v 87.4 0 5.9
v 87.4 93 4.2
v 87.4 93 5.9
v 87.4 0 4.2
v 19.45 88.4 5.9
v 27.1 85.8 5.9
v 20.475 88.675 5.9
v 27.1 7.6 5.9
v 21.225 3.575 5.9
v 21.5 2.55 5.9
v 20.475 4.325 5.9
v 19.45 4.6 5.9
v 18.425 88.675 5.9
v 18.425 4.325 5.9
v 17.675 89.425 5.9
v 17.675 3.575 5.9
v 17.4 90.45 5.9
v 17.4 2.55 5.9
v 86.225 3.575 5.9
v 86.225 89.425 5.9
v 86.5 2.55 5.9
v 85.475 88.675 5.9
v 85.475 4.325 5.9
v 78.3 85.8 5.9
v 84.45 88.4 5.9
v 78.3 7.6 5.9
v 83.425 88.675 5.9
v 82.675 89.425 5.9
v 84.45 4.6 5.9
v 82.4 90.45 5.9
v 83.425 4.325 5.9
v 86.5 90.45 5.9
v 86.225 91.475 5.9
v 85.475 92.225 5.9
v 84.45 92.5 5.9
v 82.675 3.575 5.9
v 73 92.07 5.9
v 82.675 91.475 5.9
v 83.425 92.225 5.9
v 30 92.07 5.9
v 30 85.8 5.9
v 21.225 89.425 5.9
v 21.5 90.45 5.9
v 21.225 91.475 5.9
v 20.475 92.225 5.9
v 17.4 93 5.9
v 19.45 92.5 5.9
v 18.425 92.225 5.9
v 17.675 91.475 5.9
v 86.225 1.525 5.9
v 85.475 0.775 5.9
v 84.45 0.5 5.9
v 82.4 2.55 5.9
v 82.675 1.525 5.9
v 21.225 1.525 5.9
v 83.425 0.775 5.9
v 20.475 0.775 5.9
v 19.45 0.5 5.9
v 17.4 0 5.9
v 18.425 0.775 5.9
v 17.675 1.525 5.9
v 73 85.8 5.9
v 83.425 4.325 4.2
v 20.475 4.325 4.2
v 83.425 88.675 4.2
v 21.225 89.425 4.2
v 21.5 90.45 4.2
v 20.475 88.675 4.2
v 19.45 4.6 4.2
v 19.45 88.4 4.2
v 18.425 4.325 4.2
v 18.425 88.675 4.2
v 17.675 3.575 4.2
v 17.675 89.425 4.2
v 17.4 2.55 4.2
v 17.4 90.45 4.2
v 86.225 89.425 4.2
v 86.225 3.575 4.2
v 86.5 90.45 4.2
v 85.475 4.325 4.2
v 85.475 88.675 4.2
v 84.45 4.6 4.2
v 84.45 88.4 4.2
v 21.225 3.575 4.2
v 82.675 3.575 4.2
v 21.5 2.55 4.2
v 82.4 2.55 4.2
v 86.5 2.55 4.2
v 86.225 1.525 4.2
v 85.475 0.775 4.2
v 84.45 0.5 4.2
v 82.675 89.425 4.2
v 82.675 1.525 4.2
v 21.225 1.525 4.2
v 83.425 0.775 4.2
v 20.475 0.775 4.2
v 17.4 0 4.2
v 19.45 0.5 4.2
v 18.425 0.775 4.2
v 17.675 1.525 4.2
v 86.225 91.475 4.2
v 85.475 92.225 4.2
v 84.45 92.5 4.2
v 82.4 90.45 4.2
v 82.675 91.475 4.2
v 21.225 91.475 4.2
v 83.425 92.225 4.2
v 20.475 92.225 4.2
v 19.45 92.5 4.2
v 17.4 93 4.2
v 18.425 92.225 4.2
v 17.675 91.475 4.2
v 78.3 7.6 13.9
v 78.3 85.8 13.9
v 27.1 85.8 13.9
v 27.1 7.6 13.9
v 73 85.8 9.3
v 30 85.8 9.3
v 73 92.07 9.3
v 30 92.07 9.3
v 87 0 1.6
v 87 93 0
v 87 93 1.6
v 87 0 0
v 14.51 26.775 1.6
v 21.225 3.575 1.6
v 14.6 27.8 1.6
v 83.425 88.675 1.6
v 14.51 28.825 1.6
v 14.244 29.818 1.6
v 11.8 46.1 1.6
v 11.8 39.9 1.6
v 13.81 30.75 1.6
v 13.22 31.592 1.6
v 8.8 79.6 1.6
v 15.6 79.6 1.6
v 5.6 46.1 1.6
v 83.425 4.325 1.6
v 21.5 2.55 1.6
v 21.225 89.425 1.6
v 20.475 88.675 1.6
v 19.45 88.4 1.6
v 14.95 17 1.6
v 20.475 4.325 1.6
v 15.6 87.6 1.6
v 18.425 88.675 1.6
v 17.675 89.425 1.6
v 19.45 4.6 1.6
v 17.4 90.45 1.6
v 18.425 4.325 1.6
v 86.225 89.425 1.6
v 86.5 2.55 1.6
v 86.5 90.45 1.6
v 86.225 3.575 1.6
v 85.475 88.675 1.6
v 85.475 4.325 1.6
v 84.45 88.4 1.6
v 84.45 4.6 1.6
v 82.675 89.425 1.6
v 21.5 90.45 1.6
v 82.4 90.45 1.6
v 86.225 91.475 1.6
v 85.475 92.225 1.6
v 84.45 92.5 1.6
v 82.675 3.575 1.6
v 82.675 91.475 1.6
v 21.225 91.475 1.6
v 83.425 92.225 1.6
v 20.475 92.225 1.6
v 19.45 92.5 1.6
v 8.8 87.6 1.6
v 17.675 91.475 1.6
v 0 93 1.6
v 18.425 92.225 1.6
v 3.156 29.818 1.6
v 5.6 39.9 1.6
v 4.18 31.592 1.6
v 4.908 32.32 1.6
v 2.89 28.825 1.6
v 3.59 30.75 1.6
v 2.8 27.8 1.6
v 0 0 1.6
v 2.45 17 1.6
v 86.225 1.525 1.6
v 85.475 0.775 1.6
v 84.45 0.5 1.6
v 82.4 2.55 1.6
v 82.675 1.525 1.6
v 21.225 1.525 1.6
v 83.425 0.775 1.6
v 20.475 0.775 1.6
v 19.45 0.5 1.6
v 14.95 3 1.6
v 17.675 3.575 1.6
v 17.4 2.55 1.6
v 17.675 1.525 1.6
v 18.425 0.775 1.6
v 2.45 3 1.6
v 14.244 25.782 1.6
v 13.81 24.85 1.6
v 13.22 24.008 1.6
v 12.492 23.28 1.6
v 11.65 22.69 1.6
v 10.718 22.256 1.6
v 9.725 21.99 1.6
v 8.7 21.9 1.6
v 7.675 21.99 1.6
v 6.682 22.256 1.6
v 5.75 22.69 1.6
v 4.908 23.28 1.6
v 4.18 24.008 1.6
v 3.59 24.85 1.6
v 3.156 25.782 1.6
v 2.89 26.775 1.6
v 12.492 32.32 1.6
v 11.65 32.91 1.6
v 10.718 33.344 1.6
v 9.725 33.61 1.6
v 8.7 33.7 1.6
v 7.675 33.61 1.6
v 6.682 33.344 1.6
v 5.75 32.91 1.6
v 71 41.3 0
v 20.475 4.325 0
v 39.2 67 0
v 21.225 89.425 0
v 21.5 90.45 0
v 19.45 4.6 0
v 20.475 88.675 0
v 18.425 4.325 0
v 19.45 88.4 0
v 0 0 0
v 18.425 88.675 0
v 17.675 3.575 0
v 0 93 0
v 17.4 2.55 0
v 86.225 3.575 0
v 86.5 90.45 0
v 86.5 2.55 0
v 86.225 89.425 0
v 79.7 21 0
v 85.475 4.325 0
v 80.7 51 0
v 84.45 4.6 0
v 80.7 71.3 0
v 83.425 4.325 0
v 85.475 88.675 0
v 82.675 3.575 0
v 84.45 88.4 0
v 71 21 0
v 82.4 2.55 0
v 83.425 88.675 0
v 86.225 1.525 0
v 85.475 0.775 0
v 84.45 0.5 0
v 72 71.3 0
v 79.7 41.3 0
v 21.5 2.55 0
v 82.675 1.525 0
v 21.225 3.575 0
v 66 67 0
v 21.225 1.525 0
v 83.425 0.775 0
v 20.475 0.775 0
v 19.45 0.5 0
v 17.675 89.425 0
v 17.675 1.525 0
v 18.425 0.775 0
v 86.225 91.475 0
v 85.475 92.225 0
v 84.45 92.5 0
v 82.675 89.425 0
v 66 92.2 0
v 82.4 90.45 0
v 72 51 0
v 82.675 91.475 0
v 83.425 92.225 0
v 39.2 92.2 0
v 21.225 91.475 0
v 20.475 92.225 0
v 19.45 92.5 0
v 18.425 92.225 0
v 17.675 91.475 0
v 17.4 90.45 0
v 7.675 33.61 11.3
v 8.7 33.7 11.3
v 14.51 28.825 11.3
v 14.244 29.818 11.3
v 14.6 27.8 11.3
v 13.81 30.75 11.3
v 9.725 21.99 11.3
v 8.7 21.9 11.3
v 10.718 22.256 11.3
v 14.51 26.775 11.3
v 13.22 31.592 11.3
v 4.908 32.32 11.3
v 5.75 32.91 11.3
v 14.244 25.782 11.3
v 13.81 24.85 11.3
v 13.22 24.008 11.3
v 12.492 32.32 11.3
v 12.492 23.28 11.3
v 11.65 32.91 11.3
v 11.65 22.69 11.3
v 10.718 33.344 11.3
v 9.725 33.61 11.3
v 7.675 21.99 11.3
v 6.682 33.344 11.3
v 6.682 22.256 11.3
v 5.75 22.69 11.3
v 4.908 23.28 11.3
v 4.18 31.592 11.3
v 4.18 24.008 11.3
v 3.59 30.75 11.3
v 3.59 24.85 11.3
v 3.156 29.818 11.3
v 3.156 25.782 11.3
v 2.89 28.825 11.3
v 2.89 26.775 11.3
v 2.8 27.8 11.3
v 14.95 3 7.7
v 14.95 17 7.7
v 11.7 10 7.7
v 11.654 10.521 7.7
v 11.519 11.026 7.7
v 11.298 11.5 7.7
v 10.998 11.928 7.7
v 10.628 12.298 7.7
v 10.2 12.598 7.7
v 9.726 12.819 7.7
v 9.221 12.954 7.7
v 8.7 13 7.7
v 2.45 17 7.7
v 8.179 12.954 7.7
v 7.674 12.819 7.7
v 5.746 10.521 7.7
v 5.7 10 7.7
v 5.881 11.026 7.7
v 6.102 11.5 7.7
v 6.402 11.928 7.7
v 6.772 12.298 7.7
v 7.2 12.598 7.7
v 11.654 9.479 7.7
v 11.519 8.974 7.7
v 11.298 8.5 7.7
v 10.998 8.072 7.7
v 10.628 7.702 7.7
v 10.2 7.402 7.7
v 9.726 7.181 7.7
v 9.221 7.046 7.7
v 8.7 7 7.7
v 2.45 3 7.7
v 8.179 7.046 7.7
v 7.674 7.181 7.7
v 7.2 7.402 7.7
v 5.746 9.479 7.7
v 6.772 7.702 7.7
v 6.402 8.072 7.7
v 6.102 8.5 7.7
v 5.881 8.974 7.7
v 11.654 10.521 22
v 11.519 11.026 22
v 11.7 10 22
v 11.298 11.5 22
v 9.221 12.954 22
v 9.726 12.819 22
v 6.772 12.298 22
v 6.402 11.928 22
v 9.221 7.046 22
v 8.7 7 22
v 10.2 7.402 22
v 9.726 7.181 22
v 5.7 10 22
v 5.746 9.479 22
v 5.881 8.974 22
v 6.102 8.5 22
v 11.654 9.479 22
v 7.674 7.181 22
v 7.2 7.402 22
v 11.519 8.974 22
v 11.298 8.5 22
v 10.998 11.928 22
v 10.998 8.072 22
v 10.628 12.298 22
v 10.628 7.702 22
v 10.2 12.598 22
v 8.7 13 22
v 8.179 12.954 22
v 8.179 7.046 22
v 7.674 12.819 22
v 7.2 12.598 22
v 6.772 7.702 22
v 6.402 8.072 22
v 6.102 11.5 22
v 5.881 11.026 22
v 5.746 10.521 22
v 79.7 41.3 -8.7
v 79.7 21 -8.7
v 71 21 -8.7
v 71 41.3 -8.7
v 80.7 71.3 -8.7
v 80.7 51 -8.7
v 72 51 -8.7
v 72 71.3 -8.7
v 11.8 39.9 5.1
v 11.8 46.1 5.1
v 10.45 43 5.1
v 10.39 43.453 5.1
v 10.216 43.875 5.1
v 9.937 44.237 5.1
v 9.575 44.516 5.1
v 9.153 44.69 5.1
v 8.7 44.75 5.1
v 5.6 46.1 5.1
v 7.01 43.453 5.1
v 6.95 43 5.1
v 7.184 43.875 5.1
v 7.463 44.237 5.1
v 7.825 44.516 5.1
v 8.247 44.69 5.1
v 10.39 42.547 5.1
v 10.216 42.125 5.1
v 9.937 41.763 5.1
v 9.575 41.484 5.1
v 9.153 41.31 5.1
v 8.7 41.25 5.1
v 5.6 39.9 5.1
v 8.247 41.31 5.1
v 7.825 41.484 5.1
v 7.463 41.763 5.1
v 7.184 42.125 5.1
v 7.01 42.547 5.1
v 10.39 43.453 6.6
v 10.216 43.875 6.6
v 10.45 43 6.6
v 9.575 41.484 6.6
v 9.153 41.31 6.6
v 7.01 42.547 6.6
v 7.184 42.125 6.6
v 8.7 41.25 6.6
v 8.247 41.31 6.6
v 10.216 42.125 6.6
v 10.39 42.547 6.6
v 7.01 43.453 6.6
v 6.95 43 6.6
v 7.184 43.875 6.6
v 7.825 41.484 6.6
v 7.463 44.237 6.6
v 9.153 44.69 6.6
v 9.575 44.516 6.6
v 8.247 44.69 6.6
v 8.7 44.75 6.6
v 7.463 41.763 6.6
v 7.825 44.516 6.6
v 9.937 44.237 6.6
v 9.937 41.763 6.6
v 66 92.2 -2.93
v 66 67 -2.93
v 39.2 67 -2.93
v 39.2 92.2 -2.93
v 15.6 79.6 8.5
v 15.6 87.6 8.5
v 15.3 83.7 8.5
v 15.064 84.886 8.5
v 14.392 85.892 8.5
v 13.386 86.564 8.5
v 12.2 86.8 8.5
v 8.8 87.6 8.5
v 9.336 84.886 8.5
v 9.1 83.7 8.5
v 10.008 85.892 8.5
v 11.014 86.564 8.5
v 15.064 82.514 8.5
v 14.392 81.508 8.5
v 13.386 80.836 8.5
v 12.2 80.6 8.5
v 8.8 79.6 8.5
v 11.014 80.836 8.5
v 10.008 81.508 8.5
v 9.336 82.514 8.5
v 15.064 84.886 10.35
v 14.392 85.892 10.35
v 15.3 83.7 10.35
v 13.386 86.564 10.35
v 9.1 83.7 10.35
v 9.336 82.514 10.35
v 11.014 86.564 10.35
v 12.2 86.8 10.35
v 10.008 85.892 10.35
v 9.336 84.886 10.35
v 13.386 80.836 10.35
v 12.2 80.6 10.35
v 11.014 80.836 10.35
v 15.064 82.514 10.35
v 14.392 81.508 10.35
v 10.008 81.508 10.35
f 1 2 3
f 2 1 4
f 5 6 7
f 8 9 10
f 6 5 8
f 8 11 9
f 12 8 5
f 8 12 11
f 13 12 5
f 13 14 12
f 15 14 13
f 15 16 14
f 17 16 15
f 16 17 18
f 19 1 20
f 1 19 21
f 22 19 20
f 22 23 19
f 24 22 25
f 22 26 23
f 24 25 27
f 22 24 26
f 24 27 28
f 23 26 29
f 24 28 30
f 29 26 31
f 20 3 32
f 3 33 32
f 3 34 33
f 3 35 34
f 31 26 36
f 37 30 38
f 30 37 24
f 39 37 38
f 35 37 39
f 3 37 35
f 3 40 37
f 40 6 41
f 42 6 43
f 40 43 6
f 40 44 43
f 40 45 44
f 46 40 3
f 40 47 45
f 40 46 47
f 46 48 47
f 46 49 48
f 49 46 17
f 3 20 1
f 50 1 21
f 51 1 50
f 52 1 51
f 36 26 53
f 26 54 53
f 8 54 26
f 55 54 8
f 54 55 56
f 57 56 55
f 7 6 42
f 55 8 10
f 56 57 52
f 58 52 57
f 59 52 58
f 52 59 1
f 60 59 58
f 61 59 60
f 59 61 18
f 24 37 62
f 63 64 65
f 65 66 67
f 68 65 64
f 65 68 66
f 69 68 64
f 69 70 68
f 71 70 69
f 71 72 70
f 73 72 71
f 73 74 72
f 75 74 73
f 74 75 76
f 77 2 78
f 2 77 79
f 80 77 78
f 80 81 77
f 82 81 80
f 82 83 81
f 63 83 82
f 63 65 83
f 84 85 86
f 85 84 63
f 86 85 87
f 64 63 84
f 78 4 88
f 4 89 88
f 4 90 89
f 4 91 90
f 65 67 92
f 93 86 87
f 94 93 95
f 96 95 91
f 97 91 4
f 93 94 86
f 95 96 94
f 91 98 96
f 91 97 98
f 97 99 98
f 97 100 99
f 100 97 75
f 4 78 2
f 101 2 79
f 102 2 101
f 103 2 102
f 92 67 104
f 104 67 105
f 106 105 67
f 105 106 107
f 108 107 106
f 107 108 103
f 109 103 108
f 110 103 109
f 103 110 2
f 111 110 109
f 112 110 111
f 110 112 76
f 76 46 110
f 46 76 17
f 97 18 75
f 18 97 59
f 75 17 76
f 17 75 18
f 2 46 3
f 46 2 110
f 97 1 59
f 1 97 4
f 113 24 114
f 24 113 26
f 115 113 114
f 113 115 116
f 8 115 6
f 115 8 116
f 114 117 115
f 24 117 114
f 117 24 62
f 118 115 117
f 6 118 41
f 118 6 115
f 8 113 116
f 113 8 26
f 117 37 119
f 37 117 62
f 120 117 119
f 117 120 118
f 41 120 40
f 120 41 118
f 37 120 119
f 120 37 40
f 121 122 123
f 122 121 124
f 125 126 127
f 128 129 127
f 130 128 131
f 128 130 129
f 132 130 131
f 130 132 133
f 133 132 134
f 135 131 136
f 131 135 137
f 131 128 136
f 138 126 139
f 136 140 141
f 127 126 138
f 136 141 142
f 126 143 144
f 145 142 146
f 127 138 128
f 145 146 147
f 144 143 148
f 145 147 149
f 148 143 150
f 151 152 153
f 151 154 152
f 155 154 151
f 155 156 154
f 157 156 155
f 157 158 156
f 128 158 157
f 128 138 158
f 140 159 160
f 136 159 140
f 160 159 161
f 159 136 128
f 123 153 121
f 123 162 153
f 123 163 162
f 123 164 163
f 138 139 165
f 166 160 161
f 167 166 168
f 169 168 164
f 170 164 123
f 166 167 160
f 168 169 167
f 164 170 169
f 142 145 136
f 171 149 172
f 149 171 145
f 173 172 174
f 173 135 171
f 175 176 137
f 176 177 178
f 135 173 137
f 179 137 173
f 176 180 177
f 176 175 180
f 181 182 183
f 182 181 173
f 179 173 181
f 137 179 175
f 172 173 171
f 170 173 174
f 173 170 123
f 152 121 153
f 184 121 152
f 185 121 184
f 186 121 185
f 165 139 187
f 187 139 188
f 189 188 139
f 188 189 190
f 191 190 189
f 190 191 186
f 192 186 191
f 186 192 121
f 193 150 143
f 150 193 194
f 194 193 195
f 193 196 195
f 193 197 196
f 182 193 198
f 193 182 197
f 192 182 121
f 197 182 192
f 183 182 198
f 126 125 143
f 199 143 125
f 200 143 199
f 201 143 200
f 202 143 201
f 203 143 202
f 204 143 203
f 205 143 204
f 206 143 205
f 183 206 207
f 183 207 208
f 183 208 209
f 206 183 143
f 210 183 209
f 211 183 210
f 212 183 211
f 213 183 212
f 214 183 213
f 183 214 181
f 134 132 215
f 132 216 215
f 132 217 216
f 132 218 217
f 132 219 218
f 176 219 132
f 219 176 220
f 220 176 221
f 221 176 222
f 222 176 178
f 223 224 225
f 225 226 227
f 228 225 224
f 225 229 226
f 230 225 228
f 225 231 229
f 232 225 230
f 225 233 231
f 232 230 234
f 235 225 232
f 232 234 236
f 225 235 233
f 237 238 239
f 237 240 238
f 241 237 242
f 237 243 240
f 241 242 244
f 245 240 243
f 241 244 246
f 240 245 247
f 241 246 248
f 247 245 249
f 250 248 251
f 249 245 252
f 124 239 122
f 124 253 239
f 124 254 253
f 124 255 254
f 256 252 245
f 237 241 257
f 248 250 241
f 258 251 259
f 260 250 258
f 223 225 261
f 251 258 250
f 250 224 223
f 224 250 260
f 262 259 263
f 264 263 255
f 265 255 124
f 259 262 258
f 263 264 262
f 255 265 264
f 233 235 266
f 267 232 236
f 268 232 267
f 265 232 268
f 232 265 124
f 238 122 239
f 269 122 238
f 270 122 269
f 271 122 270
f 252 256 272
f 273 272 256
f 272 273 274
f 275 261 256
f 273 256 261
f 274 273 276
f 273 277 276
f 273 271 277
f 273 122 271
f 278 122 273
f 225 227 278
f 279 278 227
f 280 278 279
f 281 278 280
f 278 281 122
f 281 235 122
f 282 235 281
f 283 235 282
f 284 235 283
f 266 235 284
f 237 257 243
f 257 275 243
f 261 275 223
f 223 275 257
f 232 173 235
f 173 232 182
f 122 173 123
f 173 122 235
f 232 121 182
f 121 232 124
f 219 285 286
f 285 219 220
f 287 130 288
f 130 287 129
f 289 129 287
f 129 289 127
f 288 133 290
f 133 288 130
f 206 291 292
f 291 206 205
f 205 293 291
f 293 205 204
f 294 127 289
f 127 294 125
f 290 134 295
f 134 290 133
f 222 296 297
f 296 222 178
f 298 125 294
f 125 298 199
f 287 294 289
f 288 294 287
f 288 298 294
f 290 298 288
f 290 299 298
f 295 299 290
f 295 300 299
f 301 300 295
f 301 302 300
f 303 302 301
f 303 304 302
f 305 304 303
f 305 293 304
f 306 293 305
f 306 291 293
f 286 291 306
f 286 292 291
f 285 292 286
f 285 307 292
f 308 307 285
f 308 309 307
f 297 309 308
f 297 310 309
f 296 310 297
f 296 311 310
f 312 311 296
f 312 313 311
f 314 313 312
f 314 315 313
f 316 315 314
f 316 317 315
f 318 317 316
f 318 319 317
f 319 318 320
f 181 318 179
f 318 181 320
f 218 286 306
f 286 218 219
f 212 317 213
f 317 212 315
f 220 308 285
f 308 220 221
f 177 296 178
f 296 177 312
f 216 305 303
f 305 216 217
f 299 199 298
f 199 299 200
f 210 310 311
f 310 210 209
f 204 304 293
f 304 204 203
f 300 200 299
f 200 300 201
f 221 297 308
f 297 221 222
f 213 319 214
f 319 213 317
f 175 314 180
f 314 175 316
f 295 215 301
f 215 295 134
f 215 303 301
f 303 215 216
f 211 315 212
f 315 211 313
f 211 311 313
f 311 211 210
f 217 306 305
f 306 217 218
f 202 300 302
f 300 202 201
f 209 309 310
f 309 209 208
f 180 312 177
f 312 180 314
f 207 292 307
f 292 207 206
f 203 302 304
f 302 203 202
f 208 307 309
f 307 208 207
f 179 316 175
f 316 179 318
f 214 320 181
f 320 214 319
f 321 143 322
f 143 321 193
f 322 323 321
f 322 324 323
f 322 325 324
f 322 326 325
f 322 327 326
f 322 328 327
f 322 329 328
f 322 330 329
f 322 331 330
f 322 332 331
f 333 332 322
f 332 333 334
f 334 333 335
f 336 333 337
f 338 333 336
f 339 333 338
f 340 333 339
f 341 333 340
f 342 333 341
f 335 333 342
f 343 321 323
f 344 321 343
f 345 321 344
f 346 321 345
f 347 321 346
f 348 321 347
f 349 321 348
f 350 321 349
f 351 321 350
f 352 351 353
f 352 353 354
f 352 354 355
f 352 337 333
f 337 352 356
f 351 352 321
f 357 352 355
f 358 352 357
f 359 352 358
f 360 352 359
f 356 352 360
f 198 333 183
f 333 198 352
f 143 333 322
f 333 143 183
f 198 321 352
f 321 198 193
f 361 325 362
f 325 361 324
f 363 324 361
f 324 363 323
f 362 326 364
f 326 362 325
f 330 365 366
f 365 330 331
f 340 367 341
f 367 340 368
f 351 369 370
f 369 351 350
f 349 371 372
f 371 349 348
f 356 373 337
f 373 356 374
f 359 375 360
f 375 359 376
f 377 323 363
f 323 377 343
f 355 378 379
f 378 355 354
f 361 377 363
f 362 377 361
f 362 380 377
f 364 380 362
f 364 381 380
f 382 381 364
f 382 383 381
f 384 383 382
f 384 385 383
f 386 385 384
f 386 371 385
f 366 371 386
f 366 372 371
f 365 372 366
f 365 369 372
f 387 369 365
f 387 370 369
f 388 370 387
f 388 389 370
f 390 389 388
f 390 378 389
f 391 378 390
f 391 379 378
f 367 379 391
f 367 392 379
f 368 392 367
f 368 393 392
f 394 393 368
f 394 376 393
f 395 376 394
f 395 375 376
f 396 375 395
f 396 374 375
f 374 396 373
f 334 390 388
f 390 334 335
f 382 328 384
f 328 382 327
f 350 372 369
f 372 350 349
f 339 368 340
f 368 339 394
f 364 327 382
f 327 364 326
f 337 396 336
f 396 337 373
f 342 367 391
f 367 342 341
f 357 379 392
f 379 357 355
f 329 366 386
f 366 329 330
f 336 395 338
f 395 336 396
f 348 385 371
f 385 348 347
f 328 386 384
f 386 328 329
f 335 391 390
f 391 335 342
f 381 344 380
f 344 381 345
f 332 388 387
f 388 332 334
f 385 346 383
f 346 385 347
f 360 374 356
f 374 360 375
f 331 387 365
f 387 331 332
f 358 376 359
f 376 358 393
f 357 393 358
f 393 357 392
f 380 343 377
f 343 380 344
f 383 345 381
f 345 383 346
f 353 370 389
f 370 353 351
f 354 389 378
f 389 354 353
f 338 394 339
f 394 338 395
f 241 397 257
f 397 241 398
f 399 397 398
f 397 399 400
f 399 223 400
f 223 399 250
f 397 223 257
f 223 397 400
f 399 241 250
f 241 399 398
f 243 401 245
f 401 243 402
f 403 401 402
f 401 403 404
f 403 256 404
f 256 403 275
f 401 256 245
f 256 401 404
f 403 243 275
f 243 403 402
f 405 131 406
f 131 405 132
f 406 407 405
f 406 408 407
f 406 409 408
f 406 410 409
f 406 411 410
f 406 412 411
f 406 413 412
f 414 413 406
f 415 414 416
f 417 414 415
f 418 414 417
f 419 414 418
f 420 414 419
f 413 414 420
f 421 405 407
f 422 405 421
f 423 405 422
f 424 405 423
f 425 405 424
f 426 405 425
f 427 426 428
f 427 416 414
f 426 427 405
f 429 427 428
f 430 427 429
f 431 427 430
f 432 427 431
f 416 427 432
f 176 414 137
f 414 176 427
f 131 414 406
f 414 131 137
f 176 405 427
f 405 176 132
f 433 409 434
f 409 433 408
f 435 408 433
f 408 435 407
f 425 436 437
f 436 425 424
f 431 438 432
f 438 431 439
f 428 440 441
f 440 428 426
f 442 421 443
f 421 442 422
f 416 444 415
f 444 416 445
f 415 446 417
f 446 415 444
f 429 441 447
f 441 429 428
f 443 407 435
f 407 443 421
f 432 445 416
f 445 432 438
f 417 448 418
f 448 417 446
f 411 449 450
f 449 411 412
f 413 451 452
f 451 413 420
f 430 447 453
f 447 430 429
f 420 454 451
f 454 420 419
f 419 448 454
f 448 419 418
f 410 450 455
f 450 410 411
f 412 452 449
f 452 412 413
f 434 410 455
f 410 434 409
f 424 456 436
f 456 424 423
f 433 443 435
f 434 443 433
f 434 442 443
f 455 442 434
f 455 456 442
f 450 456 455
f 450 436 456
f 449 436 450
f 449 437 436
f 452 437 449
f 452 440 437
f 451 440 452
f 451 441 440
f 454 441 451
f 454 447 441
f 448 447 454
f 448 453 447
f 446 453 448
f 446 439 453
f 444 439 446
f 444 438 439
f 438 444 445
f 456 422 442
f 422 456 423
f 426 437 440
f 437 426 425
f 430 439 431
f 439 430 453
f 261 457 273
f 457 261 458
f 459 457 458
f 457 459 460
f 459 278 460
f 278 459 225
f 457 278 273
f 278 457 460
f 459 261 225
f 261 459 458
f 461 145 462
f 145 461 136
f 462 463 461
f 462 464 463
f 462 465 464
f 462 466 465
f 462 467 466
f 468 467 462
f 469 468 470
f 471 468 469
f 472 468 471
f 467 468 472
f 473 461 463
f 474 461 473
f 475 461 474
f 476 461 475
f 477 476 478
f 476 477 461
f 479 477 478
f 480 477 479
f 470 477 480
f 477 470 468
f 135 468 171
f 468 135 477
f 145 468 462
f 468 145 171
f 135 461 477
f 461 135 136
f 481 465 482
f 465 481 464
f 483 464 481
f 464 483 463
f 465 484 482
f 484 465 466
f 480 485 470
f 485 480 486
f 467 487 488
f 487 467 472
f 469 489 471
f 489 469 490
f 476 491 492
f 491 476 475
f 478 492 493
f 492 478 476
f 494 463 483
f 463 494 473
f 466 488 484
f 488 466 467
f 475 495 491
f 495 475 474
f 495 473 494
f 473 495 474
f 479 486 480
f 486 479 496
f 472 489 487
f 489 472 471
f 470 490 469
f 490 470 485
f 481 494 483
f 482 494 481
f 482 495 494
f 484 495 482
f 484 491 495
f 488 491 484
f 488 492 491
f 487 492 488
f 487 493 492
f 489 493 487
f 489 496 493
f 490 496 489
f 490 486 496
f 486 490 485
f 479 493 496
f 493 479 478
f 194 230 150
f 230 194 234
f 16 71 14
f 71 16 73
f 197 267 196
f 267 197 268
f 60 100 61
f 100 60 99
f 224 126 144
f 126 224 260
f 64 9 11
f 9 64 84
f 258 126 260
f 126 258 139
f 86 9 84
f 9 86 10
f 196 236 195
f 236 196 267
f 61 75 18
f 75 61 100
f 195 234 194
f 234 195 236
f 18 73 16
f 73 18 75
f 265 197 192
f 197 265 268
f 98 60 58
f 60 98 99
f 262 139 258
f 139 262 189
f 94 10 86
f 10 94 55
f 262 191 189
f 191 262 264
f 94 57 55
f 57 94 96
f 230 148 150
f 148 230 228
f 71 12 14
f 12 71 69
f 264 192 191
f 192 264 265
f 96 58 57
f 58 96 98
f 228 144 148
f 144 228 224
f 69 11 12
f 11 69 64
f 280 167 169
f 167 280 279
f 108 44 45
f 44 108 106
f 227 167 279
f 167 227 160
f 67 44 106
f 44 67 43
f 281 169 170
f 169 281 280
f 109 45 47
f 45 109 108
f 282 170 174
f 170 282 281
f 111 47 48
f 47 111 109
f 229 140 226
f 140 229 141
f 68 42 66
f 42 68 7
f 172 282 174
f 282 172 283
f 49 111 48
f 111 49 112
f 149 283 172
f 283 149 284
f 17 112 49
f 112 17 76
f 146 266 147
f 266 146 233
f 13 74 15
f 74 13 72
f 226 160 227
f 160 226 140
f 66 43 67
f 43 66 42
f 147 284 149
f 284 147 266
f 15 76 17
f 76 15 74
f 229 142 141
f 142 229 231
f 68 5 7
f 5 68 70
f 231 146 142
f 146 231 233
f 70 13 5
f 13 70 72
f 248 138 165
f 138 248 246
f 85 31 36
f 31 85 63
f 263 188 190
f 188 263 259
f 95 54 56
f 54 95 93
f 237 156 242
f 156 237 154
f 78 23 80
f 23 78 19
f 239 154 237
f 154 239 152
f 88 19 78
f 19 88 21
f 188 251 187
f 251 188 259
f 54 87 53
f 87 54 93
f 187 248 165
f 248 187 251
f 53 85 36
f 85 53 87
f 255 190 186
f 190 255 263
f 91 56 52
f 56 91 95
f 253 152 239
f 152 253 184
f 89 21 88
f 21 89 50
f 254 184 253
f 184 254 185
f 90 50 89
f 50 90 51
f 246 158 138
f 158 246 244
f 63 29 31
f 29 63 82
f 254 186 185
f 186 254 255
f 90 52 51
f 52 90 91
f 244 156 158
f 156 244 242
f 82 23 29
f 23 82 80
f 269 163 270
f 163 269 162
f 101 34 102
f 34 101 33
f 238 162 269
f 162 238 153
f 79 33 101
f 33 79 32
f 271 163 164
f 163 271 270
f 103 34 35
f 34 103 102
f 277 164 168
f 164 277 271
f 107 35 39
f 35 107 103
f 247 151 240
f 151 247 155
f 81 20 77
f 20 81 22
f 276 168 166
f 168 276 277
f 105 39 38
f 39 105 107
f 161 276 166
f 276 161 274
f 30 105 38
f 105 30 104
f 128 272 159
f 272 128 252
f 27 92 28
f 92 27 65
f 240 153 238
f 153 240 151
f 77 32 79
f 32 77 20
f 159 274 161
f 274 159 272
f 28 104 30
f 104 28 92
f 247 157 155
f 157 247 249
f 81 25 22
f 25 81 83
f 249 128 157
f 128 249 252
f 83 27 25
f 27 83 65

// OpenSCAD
// RRD (Reprap Discount) graphic smart controler
// Scad based on 

difference() {
	union(){
		// LCD module
		translate([17.4,0,4.2]) cube([70,93,1.7]); 			// PCB
		translate([27.1,7.6,5.9])cube([51.2,78.2,8]); 		// LCD
		translate([30,85.8,5.9])cube([43,6.27,3.4]); 		// Backlight
		
		// Base board PCB
		cube([87,93,1.6]); 									// PCB
		// Buzzer
		translate([8.7,27.8,1.6])cylinder(r=5.9,h=9.7,$fn=36); 
		// Encoder
		translate([8.7-(12.5/2),10-(14/2),1.6])cube([12.5,14,6.1]); 		
		translate([8.7,10,1.6])cylinder(r=3,h=20.4,$fn=36);
		// 2 X 10 pins connectors
		translate([71,21,-8.7]) cube([8.7,20.3,9]); 
		translate([72,51,-8.7]) cube([8.7,20.3,9]);
		// emergency stop switch
		translate ([8.7-(6.2/2),43-(6.2/2),1.6])cube([6.2,6.2,3.5]);	
		translate ([8.7,43,1.6+3.5])cylinder(r=1.75,h=1.5,$fn=24);	
		// sd card slot
		translate([39.2,67,-2.93]) cube([26.8,25.2,2.93]); 
		// Backlight pot
		translate([8.8,79.6,0]) cube([6.8,8,8.5]); 
		translate([12.2,83.7,8.5]) cylinder(r=3.1,h=1.85,$fn=16); 
	}

	// Mounting holes
	translate([19.45,2.55,0])cylinder(r=2.05,h=10,$fn=12); 
	translate([19.45,90.45,0])cylinder(r=2.05,h=10,$fn=12);
	translate([84.45,2.55,0])cylinder(r=2.05,h=10,$fn=12);
	translate([84.45,90.45,0])cylinder(r=2.05,h=10,$fn=12);
}
